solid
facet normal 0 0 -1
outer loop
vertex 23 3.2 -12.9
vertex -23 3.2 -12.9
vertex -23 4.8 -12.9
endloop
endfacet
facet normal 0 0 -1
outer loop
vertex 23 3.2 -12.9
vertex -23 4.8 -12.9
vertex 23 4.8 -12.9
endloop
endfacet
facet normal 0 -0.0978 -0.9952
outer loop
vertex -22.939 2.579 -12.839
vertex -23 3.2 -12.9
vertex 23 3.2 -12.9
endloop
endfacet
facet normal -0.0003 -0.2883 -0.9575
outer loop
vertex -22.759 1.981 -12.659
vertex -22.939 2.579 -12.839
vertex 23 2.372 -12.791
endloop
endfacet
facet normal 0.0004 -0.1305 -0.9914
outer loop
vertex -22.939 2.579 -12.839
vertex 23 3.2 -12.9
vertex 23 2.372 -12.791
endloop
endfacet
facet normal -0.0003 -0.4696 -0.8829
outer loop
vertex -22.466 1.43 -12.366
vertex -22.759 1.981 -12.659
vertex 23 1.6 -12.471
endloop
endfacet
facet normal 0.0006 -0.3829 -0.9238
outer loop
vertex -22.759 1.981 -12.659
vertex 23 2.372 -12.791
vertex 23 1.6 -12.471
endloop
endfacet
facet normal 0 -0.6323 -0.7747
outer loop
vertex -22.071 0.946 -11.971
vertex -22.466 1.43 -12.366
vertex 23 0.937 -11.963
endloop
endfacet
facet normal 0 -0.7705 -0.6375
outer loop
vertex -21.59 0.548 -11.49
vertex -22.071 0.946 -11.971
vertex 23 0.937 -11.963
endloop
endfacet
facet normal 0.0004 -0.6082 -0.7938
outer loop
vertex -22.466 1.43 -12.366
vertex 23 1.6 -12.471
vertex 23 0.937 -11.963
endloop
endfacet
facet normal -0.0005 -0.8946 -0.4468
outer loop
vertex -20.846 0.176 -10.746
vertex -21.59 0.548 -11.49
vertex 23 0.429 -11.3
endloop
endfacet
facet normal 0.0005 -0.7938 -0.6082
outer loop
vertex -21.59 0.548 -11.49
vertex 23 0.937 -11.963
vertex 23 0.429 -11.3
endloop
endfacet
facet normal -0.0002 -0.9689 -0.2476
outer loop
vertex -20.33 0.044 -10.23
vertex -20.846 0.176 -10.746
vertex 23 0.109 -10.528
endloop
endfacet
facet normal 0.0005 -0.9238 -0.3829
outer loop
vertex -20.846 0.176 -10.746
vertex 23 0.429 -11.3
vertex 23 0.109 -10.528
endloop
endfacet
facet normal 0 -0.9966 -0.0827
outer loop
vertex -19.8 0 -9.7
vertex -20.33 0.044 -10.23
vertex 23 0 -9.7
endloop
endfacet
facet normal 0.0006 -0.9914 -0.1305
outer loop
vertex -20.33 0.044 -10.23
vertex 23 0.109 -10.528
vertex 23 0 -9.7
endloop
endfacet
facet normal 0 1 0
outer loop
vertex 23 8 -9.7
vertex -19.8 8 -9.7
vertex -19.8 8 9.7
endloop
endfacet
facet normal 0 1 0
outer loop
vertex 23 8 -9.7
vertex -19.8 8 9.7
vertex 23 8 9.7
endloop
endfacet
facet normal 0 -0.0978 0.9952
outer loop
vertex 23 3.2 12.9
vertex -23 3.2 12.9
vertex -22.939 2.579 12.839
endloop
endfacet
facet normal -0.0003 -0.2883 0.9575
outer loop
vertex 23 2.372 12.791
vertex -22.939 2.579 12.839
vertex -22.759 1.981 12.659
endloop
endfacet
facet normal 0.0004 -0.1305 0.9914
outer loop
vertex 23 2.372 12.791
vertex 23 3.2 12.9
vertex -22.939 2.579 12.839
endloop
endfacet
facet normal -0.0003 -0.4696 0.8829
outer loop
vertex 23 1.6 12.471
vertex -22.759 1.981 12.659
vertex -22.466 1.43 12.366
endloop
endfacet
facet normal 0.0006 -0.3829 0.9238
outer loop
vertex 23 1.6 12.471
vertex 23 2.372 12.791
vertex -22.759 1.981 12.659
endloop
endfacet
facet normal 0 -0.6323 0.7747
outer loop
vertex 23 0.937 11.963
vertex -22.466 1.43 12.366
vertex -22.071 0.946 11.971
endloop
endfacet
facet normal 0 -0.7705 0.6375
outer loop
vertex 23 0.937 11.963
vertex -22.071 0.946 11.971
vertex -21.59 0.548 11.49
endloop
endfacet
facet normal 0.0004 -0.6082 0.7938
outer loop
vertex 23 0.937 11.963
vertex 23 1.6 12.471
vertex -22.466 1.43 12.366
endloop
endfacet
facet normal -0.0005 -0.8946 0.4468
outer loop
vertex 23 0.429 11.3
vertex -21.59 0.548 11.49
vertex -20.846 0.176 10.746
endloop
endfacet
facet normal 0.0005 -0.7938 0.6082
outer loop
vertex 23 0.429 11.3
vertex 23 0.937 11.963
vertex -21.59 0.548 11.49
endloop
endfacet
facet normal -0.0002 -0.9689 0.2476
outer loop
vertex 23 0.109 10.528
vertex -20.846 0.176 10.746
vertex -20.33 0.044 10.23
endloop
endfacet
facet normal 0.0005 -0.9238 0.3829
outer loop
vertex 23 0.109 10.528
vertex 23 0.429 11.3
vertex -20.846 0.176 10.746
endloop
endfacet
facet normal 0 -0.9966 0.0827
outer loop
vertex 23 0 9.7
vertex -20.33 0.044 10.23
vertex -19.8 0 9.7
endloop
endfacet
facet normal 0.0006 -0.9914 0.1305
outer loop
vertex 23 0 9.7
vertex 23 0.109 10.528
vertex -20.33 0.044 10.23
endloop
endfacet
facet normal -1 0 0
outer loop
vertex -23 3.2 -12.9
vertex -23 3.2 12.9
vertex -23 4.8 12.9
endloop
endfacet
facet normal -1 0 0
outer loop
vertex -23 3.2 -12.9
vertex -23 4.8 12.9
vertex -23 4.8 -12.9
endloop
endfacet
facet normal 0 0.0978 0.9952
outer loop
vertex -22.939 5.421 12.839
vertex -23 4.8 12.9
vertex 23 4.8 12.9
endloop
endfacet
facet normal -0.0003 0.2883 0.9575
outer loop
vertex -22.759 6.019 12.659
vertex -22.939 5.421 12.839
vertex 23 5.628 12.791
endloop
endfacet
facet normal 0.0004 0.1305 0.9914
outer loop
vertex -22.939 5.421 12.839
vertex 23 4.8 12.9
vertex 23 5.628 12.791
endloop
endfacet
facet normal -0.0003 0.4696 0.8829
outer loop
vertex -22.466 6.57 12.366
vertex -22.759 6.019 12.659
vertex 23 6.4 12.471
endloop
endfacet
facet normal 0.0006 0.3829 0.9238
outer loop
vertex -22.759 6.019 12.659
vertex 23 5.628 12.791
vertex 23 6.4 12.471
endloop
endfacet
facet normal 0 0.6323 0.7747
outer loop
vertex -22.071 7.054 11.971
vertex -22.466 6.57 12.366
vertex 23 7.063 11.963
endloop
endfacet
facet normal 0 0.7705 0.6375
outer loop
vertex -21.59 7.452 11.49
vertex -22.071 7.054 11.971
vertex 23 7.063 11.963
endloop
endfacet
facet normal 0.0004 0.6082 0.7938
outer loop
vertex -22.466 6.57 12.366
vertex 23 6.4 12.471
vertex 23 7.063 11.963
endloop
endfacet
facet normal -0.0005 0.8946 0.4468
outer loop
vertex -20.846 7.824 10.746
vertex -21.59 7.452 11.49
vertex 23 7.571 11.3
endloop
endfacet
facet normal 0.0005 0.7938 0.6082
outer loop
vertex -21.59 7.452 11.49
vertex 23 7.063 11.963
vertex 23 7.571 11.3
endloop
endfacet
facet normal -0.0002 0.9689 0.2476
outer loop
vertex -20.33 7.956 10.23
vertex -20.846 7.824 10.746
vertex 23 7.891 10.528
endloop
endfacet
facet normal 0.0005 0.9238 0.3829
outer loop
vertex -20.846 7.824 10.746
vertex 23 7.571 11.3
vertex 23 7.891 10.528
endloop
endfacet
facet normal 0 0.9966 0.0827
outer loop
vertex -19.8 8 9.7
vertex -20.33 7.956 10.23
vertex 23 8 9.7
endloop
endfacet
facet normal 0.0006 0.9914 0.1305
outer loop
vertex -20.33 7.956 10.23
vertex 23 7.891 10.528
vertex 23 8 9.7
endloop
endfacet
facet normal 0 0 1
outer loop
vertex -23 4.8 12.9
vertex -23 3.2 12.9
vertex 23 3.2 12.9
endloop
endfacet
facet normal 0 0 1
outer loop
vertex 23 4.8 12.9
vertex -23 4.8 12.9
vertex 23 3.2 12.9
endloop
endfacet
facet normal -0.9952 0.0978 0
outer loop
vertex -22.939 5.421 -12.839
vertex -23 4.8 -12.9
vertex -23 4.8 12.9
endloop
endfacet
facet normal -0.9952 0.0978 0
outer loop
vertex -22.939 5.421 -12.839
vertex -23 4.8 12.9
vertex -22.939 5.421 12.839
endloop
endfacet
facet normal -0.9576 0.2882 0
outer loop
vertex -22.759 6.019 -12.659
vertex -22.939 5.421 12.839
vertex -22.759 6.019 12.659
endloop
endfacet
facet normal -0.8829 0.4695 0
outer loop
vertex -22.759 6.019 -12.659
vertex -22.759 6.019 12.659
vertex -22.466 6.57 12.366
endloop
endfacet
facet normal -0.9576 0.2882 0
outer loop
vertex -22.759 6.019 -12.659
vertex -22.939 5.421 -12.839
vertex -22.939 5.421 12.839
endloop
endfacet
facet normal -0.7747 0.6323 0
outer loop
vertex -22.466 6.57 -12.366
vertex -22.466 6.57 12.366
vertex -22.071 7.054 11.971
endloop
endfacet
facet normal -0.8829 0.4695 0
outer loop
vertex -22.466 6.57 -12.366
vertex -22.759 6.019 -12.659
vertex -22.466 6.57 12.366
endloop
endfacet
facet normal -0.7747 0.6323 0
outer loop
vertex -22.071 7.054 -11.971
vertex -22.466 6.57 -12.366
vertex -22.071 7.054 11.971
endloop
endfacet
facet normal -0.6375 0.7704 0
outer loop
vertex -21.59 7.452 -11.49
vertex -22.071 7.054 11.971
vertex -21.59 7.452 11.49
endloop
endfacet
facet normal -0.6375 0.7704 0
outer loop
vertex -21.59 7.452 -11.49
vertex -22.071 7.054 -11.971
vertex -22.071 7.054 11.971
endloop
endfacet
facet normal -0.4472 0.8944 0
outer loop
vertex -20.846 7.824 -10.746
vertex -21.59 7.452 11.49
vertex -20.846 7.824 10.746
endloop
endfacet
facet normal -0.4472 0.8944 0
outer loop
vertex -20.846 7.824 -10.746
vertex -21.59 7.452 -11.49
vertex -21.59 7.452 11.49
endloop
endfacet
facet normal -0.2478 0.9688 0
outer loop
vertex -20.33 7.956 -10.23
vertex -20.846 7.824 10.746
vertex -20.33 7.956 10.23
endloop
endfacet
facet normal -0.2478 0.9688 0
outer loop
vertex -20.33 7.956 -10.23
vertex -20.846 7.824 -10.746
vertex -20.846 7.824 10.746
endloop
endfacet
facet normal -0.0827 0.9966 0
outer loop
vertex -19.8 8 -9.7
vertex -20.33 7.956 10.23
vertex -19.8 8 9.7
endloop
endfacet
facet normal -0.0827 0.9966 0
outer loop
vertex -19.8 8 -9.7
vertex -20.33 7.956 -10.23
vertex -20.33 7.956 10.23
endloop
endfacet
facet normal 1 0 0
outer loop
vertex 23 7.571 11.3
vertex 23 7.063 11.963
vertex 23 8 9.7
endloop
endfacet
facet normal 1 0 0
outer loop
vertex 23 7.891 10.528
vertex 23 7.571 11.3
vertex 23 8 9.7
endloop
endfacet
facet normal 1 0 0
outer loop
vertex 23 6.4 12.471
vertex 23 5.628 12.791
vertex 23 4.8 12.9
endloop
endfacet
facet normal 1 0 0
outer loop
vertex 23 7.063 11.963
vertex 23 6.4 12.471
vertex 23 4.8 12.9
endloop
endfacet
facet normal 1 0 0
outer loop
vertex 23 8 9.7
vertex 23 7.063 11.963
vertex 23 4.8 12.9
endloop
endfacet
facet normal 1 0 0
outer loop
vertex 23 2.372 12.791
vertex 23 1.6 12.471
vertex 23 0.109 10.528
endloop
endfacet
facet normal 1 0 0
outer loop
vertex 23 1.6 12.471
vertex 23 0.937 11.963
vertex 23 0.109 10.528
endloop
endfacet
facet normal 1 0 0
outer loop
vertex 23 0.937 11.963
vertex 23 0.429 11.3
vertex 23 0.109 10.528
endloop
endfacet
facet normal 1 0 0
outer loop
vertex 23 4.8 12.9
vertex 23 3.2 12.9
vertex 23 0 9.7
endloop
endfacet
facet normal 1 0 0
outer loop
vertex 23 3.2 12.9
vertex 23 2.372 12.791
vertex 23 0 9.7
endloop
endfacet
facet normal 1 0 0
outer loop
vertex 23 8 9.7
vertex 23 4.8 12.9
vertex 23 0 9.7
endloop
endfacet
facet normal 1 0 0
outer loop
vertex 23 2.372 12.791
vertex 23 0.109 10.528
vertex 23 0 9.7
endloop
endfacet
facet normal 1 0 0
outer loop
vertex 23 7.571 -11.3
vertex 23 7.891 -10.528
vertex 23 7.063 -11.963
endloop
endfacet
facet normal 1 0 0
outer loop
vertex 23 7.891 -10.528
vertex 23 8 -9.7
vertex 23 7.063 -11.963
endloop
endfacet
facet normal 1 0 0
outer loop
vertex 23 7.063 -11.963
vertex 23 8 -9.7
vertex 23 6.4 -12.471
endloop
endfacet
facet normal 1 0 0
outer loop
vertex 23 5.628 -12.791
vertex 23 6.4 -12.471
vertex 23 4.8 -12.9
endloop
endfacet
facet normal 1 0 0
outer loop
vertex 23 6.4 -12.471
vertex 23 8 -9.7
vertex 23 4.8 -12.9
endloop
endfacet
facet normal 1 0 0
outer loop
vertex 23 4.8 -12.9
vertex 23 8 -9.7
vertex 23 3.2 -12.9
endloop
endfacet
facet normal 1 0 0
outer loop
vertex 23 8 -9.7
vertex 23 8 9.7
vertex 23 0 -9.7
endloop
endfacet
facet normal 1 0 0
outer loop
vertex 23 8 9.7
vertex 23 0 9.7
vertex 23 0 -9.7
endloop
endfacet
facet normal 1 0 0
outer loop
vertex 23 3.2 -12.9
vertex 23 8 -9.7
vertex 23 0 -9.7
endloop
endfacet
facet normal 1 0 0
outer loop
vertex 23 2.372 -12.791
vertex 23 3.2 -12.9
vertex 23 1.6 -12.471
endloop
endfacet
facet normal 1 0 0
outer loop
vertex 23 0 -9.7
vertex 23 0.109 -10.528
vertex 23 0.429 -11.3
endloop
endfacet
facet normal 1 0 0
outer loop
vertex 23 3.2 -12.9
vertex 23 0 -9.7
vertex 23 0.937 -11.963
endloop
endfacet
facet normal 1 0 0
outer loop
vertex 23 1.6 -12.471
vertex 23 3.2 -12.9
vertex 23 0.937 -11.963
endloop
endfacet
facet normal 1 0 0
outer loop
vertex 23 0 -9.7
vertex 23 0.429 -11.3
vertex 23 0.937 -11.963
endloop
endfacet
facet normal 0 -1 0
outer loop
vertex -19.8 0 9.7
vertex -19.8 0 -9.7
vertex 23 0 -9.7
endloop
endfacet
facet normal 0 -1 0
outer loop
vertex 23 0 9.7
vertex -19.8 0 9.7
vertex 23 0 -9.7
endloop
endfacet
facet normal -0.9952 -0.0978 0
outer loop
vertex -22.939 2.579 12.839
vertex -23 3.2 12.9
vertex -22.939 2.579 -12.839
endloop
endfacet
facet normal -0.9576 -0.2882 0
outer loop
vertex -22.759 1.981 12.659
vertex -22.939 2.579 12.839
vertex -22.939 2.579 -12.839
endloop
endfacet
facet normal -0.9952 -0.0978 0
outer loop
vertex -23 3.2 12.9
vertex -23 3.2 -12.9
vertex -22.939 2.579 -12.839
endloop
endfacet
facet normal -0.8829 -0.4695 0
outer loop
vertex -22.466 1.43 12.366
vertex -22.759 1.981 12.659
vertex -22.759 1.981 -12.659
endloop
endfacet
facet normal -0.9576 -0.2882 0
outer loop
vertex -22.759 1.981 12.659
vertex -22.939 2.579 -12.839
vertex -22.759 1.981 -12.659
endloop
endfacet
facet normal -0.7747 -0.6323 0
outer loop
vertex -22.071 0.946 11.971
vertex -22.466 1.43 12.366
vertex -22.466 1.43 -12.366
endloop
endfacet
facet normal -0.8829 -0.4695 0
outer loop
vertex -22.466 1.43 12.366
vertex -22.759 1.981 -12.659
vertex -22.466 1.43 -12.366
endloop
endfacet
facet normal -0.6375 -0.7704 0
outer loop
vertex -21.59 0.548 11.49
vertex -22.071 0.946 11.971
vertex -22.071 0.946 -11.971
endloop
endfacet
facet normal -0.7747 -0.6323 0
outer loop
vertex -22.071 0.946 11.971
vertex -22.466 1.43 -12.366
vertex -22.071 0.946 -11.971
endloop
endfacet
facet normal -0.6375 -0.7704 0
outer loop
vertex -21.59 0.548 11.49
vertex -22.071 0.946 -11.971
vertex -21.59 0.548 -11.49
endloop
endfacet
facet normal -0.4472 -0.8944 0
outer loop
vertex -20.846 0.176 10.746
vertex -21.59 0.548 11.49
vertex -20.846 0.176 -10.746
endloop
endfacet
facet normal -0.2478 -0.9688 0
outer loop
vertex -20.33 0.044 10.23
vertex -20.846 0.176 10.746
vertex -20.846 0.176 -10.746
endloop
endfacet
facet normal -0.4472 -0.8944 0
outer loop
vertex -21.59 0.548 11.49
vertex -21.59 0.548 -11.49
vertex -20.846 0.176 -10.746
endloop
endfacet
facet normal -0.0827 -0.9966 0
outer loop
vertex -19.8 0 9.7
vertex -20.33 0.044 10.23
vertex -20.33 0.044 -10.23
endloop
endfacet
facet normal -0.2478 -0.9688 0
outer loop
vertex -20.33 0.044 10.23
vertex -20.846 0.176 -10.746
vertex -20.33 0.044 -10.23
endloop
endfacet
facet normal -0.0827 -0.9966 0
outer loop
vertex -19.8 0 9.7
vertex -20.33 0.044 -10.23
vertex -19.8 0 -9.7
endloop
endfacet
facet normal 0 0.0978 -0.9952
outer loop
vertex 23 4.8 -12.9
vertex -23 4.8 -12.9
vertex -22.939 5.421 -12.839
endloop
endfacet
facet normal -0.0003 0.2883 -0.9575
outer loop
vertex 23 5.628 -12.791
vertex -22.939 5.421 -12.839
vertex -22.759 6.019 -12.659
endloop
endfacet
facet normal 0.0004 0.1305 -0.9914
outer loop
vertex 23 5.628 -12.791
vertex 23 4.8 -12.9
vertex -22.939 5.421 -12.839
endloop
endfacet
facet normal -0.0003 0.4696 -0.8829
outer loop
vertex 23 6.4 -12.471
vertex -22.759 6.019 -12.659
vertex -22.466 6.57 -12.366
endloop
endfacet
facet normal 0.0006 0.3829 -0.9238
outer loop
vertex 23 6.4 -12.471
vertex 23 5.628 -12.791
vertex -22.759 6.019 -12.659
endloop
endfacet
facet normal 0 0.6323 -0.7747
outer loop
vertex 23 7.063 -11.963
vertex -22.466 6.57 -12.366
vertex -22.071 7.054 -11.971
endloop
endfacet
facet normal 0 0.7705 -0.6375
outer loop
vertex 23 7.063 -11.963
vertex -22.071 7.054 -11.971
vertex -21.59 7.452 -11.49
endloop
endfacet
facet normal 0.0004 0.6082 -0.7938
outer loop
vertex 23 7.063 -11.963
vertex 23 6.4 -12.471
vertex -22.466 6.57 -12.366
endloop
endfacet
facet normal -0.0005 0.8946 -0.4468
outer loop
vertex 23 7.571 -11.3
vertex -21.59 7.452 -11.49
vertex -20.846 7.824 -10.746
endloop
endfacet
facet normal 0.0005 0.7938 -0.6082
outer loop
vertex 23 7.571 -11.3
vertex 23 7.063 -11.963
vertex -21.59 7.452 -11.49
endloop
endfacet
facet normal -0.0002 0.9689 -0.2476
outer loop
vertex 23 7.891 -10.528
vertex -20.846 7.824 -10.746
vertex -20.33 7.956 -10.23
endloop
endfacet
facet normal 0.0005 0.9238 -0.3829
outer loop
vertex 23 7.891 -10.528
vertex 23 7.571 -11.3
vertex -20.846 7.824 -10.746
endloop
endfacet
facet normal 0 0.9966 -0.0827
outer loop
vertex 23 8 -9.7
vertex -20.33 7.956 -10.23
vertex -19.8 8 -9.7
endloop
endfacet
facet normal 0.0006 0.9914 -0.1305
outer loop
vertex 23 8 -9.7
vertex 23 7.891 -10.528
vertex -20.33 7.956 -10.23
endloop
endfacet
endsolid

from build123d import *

# Parameters (mm, degrees)
SKETCH_1_W      = 46
SKETCH_1_H      = 25.8
EXTRUDE_1_DEPTH = 8
FILLET_1_R      = 3.2


with BuildPart() as part:
    # 草图1 → 凸台-拉伸1 (new body)
    with BuildSketch(Plane(origin=(0, 0, 0), x_dir=(1, 0, 0), z_dir=(0, 1, 0))):
        Rectangle(SKETCH_1_W, SKETCH_1_H)
    extrude(amount=EXTRUDE_1_DEPTH)

    # 圆角1
    fillet_1_edges = [part.edges().sort_by_distance(p)[0] for p in [
        (0, 8, -12.9),
        (-23, 8, 0),
        (0, 0, -12.9),
        (0, 0, 12.9),
        (-23, 0, 0),
        (0, 8, 12.9),
    ]]
    fillet(fillet_1_edges, radius=FILLET_1_R)


solid = part.part
